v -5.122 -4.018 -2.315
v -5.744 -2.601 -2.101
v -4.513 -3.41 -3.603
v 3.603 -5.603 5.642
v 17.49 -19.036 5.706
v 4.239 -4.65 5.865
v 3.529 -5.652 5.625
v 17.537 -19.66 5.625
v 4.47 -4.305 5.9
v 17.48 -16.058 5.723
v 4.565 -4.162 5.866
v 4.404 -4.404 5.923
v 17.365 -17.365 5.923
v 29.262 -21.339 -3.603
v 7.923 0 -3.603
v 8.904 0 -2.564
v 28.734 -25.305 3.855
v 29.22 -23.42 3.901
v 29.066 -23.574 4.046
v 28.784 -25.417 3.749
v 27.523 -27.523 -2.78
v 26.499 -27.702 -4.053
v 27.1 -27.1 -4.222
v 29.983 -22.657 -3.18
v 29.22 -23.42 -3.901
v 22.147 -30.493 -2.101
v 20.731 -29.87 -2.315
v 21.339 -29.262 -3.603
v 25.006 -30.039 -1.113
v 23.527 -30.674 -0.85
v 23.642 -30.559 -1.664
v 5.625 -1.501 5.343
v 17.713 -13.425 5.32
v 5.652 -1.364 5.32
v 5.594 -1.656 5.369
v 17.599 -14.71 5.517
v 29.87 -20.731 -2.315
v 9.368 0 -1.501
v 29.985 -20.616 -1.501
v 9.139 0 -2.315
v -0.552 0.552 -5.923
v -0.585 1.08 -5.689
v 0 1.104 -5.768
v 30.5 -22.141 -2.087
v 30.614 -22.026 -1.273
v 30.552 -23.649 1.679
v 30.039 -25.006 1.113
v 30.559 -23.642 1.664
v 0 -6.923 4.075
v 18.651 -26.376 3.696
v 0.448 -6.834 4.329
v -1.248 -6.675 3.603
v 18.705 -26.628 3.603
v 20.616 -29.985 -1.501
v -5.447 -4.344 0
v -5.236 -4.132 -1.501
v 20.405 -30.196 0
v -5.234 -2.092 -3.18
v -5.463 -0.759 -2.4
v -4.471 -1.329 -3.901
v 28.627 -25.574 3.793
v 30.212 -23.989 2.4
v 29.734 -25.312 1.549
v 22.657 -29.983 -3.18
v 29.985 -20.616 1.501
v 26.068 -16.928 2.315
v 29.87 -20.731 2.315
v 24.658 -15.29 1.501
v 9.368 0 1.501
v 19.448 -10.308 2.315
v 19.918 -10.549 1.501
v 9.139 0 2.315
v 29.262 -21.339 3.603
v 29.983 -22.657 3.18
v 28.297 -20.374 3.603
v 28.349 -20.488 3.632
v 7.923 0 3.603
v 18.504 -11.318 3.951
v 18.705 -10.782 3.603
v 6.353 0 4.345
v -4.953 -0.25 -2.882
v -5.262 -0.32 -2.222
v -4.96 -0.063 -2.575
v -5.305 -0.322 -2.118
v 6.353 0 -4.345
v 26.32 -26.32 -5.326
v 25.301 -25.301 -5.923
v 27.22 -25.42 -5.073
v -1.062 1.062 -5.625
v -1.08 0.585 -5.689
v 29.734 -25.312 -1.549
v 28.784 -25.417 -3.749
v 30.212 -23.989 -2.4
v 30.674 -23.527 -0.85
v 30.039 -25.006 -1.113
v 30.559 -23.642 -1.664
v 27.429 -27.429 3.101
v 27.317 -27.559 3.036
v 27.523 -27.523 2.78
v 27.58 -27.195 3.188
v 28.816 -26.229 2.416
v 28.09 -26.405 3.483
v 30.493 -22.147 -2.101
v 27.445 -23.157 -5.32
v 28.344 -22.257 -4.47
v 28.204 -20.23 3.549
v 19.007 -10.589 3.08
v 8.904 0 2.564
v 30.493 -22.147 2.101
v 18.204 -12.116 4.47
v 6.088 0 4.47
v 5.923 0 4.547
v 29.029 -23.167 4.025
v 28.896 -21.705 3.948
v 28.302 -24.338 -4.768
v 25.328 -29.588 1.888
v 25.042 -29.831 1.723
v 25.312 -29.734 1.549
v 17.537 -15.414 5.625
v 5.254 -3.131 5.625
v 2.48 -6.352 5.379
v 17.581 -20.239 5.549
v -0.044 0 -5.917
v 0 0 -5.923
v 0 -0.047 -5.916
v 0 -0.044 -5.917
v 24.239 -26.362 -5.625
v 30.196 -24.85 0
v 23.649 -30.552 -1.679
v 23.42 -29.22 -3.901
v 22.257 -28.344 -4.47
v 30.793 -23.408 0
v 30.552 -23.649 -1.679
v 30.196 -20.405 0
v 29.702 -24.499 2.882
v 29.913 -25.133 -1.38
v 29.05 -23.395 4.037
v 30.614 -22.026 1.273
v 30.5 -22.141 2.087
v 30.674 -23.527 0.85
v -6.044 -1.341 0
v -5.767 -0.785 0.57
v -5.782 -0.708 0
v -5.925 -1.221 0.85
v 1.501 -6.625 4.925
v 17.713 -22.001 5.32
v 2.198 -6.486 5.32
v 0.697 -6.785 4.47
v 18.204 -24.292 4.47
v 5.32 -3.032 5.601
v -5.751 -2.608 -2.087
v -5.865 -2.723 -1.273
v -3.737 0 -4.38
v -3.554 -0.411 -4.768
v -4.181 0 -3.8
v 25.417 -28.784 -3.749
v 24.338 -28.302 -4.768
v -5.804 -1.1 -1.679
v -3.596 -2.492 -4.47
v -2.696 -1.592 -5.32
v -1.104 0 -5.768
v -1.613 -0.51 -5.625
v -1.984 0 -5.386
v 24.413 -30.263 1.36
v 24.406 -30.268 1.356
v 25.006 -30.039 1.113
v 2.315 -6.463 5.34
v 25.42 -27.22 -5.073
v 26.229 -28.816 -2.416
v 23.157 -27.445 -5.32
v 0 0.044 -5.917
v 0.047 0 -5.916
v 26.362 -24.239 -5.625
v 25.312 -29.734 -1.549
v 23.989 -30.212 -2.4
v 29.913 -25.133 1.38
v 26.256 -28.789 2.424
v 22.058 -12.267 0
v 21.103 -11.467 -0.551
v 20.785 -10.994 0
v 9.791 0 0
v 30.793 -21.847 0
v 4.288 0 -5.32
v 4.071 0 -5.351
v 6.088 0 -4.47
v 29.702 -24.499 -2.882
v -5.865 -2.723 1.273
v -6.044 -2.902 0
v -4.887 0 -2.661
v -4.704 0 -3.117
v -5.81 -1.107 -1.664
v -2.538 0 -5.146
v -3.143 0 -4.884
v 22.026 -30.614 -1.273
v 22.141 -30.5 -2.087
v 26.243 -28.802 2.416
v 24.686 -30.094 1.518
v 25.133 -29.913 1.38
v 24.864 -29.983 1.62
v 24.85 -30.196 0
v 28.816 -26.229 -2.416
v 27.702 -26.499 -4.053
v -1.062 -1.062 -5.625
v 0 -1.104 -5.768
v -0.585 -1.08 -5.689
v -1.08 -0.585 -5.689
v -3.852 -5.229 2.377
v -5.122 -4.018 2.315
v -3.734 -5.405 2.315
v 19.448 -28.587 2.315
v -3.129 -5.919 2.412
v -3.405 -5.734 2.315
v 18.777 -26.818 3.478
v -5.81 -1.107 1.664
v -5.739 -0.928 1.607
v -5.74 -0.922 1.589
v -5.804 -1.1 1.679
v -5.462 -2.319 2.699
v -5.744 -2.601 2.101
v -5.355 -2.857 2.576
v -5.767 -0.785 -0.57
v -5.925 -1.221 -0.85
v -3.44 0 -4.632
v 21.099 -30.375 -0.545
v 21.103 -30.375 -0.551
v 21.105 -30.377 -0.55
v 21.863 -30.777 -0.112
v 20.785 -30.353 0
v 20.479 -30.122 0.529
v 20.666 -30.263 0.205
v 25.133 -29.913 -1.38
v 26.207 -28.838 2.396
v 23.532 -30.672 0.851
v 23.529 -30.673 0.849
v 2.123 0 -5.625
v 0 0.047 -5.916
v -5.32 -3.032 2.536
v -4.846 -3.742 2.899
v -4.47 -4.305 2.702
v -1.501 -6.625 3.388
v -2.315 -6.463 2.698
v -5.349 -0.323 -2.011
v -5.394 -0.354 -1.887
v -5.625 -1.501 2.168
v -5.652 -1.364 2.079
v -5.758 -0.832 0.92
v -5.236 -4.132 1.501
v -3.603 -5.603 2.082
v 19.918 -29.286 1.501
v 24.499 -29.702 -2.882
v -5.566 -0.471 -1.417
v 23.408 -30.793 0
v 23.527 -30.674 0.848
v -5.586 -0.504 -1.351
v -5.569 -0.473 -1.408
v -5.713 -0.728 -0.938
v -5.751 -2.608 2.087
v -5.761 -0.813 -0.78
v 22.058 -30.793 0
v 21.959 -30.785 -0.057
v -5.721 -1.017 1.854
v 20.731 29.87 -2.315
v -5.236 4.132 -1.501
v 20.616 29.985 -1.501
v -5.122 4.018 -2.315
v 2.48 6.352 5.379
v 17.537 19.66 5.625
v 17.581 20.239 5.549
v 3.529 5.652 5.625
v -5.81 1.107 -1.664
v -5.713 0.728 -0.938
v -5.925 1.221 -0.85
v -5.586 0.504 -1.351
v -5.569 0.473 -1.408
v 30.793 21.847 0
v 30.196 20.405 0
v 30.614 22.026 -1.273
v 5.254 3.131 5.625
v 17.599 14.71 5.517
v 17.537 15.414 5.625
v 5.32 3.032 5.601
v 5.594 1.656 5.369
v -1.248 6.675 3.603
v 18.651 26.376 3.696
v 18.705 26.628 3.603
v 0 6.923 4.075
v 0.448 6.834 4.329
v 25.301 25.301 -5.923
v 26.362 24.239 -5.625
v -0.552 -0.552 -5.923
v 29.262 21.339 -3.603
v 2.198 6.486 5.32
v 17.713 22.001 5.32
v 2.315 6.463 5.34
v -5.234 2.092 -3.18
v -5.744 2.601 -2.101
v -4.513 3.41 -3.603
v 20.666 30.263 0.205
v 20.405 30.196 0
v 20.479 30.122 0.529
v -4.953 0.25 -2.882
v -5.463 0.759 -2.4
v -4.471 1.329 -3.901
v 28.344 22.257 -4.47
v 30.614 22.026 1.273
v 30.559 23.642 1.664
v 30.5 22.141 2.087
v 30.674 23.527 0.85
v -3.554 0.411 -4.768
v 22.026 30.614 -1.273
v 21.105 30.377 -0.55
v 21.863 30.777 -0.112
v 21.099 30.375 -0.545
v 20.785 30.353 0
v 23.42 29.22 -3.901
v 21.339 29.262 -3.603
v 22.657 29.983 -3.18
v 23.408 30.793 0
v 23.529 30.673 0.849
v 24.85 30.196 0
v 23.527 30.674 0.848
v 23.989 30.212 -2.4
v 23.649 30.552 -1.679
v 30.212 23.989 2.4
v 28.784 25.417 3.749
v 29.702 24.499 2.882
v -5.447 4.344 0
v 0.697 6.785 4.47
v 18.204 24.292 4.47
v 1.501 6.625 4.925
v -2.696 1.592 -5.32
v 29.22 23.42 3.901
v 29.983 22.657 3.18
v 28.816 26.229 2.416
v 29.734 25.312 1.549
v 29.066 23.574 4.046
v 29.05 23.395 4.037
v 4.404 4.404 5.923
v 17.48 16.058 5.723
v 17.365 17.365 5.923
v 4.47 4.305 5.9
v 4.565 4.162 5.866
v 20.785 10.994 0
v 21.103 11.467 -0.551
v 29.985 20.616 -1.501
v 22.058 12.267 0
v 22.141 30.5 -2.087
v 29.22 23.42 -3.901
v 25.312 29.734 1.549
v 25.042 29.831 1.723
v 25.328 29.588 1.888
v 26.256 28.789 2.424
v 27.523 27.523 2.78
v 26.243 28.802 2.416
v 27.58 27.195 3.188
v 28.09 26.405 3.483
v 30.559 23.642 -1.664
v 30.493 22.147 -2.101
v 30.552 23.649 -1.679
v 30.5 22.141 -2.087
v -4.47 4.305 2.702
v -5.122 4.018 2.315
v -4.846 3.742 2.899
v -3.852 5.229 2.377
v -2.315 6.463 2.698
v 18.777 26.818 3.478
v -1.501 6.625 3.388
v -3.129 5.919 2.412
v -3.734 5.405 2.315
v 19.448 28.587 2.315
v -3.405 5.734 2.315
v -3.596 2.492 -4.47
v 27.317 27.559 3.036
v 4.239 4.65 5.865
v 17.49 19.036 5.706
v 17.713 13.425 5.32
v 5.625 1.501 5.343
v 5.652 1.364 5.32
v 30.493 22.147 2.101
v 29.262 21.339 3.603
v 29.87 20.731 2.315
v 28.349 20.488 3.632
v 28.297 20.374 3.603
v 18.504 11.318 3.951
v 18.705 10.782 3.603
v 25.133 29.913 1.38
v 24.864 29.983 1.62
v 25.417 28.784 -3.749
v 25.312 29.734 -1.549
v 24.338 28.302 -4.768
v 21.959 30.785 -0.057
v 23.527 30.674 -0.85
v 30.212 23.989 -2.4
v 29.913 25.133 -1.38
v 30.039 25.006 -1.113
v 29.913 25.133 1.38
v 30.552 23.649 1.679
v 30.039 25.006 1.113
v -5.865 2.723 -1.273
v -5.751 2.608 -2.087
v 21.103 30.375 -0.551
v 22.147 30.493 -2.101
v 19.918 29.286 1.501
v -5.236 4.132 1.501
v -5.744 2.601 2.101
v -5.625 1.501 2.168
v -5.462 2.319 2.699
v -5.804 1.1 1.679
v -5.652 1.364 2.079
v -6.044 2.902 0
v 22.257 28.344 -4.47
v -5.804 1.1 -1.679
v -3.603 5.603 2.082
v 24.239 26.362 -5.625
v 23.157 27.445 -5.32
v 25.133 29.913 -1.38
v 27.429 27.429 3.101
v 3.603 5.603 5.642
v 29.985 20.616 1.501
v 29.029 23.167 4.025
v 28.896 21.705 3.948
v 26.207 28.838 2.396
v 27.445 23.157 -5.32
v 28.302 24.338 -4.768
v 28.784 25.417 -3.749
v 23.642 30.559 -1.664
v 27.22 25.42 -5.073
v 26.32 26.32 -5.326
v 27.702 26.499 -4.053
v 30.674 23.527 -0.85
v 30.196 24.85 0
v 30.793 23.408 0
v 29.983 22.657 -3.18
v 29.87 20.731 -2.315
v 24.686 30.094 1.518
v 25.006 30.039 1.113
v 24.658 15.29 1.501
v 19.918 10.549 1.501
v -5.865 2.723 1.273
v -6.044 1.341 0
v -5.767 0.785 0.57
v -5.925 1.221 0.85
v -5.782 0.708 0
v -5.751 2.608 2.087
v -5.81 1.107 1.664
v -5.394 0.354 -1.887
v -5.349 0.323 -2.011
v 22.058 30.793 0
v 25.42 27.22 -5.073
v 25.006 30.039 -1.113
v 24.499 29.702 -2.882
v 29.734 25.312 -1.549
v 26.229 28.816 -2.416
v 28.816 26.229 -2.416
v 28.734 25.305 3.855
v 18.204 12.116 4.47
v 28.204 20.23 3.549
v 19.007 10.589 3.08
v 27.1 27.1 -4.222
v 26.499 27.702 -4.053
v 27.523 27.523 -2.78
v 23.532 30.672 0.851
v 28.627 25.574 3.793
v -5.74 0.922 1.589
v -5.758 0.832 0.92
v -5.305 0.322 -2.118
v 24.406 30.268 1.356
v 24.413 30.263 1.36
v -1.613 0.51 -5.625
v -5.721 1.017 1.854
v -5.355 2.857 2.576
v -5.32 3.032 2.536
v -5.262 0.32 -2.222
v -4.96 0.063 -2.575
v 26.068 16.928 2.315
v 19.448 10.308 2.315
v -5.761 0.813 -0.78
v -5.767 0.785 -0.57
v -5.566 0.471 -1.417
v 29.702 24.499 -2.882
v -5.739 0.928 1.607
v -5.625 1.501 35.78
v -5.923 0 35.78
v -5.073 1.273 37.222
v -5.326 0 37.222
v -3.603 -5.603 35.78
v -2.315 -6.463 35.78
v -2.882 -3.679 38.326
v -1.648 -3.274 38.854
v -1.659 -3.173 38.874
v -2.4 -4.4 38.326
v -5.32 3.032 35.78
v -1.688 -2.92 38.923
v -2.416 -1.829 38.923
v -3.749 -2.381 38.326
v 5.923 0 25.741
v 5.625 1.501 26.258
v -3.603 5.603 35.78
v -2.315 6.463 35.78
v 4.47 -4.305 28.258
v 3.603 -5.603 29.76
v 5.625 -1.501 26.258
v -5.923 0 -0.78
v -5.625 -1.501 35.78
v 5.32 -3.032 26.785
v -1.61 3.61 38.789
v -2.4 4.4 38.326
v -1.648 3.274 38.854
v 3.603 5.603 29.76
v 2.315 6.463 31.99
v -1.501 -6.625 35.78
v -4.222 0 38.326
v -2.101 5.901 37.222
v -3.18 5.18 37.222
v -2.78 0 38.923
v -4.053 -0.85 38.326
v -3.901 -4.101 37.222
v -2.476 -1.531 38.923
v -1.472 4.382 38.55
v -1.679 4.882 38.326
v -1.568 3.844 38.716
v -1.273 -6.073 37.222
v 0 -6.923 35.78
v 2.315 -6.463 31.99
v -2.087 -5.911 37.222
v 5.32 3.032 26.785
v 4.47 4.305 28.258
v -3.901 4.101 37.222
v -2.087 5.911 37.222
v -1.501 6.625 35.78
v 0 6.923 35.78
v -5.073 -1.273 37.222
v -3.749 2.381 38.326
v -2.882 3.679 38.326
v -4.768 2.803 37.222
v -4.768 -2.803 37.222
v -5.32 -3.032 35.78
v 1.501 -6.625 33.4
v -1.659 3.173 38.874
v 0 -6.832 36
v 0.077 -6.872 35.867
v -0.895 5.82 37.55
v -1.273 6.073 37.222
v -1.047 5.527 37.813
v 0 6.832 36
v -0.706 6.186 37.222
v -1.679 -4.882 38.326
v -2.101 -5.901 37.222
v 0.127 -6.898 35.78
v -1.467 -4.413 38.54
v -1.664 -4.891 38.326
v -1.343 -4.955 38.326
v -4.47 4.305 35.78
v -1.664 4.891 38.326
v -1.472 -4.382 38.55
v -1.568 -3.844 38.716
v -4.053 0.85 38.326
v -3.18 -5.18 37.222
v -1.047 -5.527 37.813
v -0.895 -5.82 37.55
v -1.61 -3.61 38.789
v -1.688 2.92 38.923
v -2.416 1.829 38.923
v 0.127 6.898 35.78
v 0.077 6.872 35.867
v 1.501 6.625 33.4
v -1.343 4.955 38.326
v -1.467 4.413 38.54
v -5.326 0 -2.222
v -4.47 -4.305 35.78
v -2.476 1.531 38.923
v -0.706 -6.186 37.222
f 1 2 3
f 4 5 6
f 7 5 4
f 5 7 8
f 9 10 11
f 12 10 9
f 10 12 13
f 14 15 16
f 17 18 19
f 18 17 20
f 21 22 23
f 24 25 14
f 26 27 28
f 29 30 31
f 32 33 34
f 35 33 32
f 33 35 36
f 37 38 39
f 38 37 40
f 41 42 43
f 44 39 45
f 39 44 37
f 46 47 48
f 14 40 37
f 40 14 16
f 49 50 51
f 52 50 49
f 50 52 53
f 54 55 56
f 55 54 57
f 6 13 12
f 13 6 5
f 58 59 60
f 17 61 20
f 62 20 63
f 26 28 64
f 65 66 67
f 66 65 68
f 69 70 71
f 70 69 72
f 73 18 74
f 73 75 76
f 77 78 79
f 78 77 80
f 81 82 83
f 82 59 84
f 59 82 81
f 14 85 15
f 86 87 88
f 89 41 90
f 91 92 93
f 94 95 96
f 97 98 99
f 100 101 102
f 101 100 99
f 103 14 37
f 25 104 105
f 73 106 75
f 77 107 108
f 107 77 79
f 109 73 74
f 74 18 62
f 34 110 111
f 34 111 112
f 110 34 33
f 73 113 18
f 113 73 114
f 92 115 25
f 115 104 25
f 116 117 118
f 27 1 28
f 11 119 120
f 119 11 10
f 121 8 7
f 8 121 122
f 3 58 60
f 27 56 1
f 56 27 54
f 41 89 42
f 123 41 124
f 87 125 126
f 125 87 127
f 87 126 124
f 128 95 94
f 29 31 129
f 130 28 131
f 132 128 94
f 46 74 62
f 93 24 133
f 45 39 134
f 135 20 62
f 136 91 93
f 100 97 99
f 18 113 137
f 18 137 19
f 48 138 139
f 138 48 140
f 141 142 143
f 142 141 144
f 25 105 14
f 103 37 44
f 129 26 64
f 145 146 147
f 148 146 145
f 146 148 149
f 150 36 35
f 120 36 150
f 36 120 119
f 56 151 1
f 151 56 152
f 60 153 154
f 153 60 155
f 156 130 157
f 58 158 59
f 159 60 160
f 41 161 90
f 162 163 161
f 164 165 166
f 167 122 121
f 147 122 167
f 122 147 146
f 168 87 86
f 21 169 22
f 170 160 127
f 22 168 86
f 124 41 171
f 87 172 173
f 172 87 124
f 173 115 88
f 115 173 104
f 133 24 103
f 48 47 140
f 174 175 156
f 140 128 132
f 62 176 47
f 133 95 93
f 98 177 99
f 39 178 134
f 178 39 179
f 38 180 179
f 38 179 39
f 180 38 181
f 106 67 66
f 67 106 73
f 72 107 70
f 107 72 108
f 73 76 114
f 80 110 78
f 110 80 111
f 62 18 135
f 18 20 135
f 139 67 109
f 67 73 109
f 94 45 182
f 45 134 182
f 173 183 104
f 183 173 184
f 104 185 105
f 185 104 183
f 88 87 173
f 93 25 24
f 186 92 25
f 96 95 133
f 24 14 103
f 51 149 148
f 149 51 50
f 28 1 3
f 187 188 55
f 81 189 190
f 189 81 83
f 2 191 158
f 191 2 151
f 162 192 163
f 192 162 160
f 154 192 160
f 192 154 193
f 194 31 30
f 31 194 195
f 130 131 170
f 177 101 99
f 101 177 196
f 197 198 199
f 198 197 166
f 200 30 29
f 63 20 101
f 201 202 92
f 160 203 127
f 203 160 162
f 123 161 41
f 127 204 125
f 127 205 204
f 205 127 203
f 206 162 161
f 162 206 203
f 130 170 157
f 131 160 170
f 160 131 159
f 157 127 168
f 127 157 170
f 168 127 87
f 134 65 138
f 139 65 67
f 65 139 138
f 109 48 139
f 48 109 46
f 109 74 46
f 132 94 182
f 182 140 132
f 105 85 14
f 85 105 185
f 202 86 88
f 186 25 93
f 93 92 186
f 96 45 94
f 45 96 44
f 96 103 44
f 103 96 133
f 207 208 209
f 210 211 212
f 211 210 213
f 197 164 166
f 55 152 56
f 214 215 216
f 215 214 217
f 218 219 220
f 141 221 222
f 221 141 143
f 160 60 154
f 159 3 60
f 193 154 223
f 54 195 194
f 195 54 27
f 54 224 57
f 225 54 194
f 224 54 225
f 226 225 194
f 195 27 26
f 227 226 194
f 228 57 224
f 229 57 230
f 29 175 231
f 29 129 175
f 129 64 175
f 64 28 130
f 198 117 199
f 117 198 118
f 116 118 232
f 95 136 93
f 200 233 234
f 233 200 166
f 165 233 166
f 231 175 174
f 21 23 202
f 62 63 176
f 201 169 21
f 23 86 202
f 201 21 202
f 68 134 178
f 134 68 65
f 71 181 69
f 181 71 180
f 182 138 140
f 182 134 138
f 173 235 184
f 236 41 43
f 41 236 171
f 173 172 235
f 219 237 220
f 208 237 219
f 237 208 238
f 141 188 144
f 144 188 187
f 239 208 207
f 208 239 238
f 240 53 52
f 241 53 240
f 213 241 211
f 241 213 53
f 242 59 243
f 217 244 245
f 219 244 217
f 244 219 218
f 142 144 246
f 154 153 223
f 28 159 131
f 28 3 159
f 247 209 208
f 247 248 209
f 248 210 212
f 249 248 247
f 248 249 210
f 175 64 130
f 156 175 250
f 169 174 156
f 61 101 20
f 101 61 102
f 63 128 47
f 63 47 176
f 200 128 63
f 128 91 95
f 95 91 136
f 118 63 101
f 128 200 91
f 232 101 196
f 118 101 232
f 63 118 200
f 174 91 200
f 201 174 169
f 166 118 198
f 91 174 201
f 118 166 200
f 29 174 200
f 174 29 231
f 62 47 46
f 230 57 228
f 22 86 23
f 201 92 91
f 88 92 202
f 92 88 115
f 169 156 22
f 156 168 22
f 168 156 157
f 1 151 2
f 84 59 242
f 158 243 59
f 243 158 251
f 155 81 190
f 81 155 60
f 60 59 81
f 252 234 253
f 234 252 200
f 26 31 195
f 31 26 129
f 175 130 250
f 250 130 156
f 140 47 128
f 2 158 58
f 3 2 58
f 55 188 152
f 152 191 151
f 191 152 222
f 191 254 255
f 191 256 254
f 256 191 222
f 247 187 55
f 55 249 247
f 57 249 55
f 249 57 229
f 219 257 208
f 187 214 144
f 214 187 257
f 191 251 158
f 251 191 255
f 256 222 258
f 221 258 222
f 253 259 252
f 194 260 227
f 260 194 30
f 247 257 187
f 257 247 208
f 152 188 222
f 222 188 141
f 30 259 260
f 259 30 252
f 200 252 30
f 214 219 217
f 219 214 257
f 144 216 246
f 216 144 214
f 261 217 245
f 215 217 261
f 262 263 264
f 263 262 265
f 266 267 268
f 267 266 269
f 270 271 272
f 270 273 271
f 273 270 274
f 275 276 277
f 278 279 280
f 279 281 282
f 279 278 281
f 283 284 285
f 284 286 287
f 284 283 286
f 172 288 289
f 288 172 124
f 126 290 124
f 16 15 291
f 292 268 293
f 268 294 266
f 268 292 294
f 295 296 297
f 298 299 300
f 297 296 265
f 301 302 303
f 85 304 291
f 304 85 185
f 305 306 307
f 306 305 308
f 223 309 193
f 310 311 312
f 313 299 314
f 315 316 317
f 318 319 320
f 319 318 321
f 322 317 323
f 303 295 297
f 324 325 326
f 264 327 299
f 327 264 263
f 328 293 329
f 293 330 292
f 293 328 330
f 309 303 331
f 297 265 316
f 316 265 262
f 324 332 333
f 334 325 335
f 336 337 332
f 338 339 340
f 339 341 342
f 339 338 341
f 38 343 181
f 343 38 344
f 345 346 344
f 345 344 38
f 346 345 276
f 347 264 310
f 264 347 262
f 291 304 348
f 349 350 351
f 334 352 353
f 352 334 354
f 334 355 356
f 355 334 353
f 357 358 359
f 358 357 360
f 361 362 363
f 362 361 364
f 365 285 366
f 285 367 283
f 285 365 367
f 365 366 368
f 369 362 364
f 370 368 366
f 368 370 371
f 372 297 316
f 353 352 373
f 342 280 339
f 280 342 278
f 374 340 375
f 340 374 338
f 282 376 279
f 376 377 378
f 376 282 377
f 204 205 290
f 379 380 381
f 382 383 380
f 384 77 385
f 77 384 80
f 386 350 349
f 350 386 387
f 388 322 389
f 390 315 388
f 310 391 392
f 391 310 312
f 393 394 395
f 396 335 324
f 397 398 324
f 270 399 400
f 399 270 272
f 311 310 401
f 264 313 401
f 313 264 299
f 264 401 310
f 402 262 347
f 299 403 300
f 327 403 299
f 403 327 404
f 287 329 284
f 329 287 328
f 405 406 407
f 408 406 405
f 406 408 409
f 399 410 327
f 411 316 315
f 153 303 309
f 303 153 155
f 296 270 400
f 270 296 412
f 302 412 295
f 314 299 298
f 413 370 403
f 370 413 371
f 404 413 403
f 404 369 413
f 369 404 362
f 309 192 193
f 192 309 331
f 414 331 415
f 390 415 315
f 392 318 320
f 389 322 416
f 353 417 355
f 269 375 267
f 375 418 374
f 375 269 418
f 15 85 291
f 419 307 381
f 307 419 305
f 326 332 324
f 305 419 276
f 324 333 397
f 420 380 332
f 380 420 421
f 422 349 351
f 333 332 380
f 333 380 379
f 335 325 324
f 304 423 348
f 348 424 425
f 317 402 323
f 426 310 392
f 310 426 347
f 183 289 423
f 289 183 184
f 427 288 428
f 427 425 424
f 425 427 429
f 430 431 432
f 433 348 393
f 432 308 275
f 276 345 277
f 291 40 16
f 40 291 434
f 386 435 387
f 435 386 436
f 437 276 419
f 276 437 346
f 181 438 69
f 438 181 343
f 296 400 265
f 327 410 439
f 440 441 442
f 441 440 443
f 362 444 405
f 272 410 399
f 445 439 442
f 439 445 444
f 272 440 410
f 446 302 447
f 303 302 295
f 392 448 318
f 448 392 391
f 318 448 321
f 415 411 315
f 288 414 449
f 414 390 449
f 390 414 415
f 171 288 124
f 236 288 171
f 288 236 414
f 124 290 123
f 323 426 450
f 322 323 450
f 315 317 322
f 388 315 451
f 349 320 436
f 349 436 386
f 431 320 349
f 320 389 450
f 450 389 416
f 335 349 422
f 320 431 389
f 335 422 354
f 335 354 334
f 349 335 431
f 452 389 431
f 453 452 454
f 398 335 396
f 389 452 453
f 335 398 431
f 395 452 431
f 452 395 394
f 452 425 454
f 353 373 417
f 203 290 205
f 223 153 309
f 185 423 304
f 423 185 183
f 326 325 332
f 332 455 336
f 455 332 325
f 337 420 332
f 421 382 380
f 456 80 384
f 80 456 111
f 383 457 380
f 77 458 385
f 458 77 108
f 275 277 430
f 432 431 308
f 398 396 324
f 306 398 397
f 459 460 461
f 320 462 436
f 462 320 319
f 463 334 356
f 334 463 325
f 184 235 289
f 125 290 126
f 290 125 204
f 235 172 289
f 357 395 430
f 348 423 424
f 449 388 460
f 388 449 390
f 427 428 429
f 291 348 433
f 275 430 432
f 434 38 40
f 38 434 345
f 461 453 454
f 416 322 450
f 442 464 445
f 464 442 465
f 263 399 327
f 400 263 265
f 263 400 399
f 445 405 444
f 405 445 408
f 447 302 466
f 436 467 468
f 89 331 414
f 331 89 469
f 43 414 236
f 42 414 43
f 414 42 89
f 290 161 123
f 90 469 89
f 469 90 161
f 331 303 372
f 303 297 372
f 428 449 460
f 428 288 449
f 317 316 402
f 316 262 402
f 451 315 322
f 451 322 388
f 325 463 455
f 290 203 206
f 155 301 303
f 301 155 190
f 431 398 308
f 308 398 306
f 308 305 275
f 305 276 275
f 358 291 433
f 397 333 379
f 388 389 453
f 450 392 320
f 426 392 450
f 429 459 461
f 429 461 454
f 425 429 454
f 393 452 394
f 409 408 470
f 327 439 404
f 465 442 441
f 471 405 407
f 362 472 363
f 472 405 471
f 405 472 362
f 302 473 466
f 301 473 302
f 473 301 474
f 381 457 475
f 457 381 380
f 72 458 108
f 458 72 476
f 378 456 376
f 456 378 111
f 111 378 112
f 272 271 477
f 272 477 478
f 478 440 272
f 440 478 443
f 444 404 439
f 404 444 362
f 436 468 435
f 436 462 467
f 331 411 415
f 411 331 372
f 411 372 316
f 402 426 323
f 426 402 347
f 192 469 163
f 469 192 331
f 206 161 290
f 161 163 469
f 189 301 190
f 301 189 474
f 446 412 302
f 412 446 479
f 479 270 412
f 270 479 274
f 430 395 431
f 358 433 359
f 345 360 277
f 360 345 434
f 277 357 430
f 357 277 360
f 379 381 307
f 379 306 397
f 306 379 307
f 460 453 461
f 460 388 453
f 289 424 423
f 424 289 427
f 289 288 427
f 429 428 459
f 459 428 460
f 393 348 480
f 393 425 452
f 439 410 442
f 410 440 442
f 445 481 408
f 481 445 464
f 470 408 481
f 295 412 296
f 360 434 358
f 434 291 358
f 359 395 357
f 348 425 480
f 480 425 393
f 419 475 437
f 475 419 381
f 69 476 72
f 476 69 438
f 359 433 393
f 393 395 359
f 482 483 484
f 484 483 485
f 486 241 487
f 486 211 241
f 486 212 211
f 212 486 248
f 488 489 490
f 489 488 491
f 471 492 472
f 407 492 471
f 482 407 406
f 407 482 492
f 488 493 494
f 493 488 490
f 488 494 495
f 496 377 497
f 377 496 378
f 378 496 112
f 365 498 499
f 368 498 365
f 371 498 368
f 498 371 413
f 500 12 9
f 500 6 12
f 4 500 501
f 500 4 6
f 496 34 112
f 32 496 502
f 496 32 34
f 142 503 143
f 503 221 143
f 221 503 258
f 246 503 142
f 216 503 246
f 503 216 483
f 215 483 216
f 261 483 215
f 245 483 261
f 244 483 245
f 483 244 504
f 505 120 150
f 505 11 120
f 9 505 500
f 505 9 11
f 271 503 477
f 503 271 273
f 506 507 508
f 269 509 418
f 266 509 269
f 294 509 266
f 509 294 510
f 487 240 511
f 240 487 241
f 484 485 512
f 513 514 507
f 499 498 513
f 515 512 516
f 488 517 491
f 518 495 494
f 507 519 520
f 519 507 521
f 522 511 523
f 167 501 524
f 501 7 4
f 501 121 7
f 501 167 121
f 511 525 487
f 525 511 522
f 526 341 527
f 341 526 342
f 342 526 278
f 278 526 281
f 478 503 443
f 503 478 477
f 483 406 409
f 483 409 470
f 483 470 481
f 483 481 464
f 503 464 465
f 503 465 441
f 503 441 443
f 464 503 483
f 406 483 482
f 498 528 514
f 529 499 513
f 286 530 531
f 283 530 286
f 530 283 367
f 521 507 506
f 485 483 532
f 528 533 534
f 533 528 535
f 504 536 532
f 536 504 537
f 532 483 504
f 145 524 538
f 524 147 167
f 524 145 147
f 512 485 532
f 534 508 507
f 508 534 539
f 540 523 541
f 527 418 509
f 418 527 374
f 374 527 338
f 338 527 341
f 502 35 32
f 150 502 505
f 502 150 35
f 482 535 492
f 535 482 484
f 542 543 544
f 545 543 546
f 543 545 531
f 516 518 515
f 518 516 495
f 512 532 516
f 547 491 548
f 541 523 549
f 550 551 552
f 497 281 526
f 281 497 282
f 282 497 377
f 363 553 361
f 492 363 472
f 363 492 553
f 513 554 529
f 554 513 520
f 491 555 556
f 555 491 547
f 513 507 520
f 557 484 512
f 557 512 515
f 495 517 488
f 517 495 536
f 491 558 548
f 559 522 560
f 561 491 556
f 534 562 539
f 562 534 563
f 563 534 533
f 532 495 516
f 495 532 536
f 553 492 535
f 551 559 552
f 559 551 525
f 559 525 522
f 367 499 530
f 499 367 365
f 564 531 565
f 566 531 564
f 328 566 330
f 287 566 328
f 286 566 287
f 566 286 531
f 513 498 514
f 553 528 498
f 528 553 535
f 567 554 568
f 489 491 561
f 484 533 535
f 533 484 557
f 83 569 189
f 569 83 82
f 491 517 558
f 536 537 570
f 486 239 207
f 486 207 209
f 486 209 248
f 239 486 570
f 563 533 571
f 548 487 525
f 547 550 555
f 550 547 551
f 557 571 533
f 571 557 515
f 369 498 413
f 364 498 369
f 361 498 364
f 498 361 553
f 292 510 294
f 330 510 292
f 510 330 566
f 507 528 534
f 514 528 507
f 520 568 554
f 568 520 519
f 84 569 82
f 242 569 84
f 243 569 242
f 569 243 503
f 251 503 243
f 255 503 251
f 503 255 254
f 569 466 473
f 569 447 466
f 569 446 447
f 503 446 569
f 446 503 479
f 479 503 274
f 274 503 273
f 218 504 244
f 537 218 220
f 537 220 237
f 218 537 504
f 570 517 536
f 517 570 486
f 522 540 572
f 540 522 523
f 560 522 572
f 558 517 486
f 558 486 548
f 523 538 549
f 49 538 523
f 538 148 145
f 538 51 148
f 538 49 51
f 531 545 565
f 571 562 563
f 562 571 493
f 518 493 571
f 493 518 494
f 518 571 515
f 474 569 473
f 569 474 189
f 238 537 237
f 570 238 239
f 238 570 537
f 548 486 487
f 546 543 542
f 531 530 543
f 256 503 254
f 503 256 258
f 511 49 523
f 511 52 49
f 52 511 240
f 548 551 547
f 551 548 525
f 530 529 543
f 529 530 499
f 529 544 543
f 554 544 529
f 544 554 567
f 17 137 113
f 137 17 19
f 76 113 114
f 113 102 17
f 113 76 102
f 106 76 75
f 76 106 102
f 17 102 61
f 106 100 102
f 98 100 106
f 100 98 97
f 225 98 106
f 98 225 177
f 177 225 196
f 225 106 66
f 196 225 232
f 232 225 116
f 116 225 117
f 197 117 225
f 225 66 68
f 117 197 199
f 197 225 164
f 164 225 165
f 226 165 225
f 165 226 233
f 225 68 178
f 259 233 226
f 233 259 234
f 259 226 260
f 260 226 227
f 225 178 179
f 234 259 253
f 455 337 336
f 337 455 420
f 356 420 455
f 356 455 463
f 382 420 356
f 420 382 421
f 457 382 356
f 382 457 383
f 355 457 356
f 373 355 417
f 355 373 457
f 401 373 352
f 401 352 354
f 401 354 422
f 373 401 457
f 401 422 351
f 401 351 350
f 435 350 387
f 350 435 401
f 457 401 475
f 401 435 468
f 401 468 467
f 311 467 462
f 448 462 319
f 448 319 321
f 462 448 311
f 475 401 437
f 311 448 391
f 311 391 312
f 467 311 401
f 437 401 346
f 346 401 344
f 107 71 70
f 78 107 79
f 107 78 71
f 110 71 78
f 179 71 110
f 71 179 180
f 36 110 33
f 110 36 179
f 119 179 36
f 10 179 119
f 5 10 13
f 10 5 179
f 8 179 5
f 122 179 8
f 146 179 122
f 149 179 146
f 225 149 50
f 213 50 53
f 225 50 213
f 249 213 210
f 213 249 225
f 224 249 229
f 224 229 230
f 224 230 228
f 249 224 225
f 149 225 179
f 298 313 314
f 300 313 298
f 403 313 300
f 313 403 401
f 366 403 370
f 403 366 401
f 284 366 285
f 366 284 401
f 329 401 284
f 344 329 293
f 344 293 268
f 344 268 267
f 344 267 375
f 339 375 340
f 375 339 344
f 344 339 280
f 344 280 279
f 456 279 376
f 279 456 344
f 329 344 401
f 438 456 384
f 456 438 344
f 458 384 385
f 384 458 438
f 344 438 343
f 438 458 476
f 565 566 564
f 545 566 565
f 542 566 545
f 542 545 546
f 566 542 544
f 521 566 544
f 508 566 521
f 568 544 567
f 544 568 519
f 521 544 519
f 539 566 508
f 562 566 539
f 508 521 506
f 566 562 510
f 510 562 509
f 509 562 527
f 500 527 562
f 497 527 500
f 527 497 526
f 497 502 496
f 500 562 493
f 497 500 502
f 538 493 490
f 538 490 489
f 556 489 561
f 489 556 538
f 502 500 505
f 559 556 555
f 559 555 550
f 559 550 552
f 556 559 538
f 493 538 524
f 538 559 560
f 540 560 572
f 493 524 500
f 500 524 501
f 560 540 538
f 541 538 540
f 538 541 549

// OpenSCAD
$fn=16;
//cosPi6 = 0.866;
cosPi3 = 0.5;
fingerHeight= cosPi3*60+5;

//finger
module finger(height,radius){
	rotate(a=90,v=[0,1,0])
		minkowski(){
			intersection_for(i = [[0, -1, 0],[2, 0, 0],[-2, 0, 0],[0, 1, 0]])
				translate (i) cylinder(r=radius, h=height, center = true);
			sphere(4);
		}
}

//phone
module phone(){
	phoneHeight = 20;
	translate([0,0,phoneHeight/2])
	cube([60,128,9+phoneHeight],center=true);
};

//sosh
module sosh(){
	difference(){
		union(){
			rotate(a=-45,v=[0,0,1])
				translate([fingerHeight/2,0,0])
					finger(fingerHeight,4);
			
			rotate(a=45,v=[0,0,1])
				translate([fingerHeight/2,0,0])
					finger(fingerHeight,4);
			
			rotate(a=-90,v=[0,1,0])
				translate([fingerHeight/2,0,0])
					finger(fingerHeight,4);
		}
		
		translate([0,0,45])
			rotate(a=60,v=[0,1,0])
				translate([60/2-10,0,0])
					phone();
	}
}

sosh();
